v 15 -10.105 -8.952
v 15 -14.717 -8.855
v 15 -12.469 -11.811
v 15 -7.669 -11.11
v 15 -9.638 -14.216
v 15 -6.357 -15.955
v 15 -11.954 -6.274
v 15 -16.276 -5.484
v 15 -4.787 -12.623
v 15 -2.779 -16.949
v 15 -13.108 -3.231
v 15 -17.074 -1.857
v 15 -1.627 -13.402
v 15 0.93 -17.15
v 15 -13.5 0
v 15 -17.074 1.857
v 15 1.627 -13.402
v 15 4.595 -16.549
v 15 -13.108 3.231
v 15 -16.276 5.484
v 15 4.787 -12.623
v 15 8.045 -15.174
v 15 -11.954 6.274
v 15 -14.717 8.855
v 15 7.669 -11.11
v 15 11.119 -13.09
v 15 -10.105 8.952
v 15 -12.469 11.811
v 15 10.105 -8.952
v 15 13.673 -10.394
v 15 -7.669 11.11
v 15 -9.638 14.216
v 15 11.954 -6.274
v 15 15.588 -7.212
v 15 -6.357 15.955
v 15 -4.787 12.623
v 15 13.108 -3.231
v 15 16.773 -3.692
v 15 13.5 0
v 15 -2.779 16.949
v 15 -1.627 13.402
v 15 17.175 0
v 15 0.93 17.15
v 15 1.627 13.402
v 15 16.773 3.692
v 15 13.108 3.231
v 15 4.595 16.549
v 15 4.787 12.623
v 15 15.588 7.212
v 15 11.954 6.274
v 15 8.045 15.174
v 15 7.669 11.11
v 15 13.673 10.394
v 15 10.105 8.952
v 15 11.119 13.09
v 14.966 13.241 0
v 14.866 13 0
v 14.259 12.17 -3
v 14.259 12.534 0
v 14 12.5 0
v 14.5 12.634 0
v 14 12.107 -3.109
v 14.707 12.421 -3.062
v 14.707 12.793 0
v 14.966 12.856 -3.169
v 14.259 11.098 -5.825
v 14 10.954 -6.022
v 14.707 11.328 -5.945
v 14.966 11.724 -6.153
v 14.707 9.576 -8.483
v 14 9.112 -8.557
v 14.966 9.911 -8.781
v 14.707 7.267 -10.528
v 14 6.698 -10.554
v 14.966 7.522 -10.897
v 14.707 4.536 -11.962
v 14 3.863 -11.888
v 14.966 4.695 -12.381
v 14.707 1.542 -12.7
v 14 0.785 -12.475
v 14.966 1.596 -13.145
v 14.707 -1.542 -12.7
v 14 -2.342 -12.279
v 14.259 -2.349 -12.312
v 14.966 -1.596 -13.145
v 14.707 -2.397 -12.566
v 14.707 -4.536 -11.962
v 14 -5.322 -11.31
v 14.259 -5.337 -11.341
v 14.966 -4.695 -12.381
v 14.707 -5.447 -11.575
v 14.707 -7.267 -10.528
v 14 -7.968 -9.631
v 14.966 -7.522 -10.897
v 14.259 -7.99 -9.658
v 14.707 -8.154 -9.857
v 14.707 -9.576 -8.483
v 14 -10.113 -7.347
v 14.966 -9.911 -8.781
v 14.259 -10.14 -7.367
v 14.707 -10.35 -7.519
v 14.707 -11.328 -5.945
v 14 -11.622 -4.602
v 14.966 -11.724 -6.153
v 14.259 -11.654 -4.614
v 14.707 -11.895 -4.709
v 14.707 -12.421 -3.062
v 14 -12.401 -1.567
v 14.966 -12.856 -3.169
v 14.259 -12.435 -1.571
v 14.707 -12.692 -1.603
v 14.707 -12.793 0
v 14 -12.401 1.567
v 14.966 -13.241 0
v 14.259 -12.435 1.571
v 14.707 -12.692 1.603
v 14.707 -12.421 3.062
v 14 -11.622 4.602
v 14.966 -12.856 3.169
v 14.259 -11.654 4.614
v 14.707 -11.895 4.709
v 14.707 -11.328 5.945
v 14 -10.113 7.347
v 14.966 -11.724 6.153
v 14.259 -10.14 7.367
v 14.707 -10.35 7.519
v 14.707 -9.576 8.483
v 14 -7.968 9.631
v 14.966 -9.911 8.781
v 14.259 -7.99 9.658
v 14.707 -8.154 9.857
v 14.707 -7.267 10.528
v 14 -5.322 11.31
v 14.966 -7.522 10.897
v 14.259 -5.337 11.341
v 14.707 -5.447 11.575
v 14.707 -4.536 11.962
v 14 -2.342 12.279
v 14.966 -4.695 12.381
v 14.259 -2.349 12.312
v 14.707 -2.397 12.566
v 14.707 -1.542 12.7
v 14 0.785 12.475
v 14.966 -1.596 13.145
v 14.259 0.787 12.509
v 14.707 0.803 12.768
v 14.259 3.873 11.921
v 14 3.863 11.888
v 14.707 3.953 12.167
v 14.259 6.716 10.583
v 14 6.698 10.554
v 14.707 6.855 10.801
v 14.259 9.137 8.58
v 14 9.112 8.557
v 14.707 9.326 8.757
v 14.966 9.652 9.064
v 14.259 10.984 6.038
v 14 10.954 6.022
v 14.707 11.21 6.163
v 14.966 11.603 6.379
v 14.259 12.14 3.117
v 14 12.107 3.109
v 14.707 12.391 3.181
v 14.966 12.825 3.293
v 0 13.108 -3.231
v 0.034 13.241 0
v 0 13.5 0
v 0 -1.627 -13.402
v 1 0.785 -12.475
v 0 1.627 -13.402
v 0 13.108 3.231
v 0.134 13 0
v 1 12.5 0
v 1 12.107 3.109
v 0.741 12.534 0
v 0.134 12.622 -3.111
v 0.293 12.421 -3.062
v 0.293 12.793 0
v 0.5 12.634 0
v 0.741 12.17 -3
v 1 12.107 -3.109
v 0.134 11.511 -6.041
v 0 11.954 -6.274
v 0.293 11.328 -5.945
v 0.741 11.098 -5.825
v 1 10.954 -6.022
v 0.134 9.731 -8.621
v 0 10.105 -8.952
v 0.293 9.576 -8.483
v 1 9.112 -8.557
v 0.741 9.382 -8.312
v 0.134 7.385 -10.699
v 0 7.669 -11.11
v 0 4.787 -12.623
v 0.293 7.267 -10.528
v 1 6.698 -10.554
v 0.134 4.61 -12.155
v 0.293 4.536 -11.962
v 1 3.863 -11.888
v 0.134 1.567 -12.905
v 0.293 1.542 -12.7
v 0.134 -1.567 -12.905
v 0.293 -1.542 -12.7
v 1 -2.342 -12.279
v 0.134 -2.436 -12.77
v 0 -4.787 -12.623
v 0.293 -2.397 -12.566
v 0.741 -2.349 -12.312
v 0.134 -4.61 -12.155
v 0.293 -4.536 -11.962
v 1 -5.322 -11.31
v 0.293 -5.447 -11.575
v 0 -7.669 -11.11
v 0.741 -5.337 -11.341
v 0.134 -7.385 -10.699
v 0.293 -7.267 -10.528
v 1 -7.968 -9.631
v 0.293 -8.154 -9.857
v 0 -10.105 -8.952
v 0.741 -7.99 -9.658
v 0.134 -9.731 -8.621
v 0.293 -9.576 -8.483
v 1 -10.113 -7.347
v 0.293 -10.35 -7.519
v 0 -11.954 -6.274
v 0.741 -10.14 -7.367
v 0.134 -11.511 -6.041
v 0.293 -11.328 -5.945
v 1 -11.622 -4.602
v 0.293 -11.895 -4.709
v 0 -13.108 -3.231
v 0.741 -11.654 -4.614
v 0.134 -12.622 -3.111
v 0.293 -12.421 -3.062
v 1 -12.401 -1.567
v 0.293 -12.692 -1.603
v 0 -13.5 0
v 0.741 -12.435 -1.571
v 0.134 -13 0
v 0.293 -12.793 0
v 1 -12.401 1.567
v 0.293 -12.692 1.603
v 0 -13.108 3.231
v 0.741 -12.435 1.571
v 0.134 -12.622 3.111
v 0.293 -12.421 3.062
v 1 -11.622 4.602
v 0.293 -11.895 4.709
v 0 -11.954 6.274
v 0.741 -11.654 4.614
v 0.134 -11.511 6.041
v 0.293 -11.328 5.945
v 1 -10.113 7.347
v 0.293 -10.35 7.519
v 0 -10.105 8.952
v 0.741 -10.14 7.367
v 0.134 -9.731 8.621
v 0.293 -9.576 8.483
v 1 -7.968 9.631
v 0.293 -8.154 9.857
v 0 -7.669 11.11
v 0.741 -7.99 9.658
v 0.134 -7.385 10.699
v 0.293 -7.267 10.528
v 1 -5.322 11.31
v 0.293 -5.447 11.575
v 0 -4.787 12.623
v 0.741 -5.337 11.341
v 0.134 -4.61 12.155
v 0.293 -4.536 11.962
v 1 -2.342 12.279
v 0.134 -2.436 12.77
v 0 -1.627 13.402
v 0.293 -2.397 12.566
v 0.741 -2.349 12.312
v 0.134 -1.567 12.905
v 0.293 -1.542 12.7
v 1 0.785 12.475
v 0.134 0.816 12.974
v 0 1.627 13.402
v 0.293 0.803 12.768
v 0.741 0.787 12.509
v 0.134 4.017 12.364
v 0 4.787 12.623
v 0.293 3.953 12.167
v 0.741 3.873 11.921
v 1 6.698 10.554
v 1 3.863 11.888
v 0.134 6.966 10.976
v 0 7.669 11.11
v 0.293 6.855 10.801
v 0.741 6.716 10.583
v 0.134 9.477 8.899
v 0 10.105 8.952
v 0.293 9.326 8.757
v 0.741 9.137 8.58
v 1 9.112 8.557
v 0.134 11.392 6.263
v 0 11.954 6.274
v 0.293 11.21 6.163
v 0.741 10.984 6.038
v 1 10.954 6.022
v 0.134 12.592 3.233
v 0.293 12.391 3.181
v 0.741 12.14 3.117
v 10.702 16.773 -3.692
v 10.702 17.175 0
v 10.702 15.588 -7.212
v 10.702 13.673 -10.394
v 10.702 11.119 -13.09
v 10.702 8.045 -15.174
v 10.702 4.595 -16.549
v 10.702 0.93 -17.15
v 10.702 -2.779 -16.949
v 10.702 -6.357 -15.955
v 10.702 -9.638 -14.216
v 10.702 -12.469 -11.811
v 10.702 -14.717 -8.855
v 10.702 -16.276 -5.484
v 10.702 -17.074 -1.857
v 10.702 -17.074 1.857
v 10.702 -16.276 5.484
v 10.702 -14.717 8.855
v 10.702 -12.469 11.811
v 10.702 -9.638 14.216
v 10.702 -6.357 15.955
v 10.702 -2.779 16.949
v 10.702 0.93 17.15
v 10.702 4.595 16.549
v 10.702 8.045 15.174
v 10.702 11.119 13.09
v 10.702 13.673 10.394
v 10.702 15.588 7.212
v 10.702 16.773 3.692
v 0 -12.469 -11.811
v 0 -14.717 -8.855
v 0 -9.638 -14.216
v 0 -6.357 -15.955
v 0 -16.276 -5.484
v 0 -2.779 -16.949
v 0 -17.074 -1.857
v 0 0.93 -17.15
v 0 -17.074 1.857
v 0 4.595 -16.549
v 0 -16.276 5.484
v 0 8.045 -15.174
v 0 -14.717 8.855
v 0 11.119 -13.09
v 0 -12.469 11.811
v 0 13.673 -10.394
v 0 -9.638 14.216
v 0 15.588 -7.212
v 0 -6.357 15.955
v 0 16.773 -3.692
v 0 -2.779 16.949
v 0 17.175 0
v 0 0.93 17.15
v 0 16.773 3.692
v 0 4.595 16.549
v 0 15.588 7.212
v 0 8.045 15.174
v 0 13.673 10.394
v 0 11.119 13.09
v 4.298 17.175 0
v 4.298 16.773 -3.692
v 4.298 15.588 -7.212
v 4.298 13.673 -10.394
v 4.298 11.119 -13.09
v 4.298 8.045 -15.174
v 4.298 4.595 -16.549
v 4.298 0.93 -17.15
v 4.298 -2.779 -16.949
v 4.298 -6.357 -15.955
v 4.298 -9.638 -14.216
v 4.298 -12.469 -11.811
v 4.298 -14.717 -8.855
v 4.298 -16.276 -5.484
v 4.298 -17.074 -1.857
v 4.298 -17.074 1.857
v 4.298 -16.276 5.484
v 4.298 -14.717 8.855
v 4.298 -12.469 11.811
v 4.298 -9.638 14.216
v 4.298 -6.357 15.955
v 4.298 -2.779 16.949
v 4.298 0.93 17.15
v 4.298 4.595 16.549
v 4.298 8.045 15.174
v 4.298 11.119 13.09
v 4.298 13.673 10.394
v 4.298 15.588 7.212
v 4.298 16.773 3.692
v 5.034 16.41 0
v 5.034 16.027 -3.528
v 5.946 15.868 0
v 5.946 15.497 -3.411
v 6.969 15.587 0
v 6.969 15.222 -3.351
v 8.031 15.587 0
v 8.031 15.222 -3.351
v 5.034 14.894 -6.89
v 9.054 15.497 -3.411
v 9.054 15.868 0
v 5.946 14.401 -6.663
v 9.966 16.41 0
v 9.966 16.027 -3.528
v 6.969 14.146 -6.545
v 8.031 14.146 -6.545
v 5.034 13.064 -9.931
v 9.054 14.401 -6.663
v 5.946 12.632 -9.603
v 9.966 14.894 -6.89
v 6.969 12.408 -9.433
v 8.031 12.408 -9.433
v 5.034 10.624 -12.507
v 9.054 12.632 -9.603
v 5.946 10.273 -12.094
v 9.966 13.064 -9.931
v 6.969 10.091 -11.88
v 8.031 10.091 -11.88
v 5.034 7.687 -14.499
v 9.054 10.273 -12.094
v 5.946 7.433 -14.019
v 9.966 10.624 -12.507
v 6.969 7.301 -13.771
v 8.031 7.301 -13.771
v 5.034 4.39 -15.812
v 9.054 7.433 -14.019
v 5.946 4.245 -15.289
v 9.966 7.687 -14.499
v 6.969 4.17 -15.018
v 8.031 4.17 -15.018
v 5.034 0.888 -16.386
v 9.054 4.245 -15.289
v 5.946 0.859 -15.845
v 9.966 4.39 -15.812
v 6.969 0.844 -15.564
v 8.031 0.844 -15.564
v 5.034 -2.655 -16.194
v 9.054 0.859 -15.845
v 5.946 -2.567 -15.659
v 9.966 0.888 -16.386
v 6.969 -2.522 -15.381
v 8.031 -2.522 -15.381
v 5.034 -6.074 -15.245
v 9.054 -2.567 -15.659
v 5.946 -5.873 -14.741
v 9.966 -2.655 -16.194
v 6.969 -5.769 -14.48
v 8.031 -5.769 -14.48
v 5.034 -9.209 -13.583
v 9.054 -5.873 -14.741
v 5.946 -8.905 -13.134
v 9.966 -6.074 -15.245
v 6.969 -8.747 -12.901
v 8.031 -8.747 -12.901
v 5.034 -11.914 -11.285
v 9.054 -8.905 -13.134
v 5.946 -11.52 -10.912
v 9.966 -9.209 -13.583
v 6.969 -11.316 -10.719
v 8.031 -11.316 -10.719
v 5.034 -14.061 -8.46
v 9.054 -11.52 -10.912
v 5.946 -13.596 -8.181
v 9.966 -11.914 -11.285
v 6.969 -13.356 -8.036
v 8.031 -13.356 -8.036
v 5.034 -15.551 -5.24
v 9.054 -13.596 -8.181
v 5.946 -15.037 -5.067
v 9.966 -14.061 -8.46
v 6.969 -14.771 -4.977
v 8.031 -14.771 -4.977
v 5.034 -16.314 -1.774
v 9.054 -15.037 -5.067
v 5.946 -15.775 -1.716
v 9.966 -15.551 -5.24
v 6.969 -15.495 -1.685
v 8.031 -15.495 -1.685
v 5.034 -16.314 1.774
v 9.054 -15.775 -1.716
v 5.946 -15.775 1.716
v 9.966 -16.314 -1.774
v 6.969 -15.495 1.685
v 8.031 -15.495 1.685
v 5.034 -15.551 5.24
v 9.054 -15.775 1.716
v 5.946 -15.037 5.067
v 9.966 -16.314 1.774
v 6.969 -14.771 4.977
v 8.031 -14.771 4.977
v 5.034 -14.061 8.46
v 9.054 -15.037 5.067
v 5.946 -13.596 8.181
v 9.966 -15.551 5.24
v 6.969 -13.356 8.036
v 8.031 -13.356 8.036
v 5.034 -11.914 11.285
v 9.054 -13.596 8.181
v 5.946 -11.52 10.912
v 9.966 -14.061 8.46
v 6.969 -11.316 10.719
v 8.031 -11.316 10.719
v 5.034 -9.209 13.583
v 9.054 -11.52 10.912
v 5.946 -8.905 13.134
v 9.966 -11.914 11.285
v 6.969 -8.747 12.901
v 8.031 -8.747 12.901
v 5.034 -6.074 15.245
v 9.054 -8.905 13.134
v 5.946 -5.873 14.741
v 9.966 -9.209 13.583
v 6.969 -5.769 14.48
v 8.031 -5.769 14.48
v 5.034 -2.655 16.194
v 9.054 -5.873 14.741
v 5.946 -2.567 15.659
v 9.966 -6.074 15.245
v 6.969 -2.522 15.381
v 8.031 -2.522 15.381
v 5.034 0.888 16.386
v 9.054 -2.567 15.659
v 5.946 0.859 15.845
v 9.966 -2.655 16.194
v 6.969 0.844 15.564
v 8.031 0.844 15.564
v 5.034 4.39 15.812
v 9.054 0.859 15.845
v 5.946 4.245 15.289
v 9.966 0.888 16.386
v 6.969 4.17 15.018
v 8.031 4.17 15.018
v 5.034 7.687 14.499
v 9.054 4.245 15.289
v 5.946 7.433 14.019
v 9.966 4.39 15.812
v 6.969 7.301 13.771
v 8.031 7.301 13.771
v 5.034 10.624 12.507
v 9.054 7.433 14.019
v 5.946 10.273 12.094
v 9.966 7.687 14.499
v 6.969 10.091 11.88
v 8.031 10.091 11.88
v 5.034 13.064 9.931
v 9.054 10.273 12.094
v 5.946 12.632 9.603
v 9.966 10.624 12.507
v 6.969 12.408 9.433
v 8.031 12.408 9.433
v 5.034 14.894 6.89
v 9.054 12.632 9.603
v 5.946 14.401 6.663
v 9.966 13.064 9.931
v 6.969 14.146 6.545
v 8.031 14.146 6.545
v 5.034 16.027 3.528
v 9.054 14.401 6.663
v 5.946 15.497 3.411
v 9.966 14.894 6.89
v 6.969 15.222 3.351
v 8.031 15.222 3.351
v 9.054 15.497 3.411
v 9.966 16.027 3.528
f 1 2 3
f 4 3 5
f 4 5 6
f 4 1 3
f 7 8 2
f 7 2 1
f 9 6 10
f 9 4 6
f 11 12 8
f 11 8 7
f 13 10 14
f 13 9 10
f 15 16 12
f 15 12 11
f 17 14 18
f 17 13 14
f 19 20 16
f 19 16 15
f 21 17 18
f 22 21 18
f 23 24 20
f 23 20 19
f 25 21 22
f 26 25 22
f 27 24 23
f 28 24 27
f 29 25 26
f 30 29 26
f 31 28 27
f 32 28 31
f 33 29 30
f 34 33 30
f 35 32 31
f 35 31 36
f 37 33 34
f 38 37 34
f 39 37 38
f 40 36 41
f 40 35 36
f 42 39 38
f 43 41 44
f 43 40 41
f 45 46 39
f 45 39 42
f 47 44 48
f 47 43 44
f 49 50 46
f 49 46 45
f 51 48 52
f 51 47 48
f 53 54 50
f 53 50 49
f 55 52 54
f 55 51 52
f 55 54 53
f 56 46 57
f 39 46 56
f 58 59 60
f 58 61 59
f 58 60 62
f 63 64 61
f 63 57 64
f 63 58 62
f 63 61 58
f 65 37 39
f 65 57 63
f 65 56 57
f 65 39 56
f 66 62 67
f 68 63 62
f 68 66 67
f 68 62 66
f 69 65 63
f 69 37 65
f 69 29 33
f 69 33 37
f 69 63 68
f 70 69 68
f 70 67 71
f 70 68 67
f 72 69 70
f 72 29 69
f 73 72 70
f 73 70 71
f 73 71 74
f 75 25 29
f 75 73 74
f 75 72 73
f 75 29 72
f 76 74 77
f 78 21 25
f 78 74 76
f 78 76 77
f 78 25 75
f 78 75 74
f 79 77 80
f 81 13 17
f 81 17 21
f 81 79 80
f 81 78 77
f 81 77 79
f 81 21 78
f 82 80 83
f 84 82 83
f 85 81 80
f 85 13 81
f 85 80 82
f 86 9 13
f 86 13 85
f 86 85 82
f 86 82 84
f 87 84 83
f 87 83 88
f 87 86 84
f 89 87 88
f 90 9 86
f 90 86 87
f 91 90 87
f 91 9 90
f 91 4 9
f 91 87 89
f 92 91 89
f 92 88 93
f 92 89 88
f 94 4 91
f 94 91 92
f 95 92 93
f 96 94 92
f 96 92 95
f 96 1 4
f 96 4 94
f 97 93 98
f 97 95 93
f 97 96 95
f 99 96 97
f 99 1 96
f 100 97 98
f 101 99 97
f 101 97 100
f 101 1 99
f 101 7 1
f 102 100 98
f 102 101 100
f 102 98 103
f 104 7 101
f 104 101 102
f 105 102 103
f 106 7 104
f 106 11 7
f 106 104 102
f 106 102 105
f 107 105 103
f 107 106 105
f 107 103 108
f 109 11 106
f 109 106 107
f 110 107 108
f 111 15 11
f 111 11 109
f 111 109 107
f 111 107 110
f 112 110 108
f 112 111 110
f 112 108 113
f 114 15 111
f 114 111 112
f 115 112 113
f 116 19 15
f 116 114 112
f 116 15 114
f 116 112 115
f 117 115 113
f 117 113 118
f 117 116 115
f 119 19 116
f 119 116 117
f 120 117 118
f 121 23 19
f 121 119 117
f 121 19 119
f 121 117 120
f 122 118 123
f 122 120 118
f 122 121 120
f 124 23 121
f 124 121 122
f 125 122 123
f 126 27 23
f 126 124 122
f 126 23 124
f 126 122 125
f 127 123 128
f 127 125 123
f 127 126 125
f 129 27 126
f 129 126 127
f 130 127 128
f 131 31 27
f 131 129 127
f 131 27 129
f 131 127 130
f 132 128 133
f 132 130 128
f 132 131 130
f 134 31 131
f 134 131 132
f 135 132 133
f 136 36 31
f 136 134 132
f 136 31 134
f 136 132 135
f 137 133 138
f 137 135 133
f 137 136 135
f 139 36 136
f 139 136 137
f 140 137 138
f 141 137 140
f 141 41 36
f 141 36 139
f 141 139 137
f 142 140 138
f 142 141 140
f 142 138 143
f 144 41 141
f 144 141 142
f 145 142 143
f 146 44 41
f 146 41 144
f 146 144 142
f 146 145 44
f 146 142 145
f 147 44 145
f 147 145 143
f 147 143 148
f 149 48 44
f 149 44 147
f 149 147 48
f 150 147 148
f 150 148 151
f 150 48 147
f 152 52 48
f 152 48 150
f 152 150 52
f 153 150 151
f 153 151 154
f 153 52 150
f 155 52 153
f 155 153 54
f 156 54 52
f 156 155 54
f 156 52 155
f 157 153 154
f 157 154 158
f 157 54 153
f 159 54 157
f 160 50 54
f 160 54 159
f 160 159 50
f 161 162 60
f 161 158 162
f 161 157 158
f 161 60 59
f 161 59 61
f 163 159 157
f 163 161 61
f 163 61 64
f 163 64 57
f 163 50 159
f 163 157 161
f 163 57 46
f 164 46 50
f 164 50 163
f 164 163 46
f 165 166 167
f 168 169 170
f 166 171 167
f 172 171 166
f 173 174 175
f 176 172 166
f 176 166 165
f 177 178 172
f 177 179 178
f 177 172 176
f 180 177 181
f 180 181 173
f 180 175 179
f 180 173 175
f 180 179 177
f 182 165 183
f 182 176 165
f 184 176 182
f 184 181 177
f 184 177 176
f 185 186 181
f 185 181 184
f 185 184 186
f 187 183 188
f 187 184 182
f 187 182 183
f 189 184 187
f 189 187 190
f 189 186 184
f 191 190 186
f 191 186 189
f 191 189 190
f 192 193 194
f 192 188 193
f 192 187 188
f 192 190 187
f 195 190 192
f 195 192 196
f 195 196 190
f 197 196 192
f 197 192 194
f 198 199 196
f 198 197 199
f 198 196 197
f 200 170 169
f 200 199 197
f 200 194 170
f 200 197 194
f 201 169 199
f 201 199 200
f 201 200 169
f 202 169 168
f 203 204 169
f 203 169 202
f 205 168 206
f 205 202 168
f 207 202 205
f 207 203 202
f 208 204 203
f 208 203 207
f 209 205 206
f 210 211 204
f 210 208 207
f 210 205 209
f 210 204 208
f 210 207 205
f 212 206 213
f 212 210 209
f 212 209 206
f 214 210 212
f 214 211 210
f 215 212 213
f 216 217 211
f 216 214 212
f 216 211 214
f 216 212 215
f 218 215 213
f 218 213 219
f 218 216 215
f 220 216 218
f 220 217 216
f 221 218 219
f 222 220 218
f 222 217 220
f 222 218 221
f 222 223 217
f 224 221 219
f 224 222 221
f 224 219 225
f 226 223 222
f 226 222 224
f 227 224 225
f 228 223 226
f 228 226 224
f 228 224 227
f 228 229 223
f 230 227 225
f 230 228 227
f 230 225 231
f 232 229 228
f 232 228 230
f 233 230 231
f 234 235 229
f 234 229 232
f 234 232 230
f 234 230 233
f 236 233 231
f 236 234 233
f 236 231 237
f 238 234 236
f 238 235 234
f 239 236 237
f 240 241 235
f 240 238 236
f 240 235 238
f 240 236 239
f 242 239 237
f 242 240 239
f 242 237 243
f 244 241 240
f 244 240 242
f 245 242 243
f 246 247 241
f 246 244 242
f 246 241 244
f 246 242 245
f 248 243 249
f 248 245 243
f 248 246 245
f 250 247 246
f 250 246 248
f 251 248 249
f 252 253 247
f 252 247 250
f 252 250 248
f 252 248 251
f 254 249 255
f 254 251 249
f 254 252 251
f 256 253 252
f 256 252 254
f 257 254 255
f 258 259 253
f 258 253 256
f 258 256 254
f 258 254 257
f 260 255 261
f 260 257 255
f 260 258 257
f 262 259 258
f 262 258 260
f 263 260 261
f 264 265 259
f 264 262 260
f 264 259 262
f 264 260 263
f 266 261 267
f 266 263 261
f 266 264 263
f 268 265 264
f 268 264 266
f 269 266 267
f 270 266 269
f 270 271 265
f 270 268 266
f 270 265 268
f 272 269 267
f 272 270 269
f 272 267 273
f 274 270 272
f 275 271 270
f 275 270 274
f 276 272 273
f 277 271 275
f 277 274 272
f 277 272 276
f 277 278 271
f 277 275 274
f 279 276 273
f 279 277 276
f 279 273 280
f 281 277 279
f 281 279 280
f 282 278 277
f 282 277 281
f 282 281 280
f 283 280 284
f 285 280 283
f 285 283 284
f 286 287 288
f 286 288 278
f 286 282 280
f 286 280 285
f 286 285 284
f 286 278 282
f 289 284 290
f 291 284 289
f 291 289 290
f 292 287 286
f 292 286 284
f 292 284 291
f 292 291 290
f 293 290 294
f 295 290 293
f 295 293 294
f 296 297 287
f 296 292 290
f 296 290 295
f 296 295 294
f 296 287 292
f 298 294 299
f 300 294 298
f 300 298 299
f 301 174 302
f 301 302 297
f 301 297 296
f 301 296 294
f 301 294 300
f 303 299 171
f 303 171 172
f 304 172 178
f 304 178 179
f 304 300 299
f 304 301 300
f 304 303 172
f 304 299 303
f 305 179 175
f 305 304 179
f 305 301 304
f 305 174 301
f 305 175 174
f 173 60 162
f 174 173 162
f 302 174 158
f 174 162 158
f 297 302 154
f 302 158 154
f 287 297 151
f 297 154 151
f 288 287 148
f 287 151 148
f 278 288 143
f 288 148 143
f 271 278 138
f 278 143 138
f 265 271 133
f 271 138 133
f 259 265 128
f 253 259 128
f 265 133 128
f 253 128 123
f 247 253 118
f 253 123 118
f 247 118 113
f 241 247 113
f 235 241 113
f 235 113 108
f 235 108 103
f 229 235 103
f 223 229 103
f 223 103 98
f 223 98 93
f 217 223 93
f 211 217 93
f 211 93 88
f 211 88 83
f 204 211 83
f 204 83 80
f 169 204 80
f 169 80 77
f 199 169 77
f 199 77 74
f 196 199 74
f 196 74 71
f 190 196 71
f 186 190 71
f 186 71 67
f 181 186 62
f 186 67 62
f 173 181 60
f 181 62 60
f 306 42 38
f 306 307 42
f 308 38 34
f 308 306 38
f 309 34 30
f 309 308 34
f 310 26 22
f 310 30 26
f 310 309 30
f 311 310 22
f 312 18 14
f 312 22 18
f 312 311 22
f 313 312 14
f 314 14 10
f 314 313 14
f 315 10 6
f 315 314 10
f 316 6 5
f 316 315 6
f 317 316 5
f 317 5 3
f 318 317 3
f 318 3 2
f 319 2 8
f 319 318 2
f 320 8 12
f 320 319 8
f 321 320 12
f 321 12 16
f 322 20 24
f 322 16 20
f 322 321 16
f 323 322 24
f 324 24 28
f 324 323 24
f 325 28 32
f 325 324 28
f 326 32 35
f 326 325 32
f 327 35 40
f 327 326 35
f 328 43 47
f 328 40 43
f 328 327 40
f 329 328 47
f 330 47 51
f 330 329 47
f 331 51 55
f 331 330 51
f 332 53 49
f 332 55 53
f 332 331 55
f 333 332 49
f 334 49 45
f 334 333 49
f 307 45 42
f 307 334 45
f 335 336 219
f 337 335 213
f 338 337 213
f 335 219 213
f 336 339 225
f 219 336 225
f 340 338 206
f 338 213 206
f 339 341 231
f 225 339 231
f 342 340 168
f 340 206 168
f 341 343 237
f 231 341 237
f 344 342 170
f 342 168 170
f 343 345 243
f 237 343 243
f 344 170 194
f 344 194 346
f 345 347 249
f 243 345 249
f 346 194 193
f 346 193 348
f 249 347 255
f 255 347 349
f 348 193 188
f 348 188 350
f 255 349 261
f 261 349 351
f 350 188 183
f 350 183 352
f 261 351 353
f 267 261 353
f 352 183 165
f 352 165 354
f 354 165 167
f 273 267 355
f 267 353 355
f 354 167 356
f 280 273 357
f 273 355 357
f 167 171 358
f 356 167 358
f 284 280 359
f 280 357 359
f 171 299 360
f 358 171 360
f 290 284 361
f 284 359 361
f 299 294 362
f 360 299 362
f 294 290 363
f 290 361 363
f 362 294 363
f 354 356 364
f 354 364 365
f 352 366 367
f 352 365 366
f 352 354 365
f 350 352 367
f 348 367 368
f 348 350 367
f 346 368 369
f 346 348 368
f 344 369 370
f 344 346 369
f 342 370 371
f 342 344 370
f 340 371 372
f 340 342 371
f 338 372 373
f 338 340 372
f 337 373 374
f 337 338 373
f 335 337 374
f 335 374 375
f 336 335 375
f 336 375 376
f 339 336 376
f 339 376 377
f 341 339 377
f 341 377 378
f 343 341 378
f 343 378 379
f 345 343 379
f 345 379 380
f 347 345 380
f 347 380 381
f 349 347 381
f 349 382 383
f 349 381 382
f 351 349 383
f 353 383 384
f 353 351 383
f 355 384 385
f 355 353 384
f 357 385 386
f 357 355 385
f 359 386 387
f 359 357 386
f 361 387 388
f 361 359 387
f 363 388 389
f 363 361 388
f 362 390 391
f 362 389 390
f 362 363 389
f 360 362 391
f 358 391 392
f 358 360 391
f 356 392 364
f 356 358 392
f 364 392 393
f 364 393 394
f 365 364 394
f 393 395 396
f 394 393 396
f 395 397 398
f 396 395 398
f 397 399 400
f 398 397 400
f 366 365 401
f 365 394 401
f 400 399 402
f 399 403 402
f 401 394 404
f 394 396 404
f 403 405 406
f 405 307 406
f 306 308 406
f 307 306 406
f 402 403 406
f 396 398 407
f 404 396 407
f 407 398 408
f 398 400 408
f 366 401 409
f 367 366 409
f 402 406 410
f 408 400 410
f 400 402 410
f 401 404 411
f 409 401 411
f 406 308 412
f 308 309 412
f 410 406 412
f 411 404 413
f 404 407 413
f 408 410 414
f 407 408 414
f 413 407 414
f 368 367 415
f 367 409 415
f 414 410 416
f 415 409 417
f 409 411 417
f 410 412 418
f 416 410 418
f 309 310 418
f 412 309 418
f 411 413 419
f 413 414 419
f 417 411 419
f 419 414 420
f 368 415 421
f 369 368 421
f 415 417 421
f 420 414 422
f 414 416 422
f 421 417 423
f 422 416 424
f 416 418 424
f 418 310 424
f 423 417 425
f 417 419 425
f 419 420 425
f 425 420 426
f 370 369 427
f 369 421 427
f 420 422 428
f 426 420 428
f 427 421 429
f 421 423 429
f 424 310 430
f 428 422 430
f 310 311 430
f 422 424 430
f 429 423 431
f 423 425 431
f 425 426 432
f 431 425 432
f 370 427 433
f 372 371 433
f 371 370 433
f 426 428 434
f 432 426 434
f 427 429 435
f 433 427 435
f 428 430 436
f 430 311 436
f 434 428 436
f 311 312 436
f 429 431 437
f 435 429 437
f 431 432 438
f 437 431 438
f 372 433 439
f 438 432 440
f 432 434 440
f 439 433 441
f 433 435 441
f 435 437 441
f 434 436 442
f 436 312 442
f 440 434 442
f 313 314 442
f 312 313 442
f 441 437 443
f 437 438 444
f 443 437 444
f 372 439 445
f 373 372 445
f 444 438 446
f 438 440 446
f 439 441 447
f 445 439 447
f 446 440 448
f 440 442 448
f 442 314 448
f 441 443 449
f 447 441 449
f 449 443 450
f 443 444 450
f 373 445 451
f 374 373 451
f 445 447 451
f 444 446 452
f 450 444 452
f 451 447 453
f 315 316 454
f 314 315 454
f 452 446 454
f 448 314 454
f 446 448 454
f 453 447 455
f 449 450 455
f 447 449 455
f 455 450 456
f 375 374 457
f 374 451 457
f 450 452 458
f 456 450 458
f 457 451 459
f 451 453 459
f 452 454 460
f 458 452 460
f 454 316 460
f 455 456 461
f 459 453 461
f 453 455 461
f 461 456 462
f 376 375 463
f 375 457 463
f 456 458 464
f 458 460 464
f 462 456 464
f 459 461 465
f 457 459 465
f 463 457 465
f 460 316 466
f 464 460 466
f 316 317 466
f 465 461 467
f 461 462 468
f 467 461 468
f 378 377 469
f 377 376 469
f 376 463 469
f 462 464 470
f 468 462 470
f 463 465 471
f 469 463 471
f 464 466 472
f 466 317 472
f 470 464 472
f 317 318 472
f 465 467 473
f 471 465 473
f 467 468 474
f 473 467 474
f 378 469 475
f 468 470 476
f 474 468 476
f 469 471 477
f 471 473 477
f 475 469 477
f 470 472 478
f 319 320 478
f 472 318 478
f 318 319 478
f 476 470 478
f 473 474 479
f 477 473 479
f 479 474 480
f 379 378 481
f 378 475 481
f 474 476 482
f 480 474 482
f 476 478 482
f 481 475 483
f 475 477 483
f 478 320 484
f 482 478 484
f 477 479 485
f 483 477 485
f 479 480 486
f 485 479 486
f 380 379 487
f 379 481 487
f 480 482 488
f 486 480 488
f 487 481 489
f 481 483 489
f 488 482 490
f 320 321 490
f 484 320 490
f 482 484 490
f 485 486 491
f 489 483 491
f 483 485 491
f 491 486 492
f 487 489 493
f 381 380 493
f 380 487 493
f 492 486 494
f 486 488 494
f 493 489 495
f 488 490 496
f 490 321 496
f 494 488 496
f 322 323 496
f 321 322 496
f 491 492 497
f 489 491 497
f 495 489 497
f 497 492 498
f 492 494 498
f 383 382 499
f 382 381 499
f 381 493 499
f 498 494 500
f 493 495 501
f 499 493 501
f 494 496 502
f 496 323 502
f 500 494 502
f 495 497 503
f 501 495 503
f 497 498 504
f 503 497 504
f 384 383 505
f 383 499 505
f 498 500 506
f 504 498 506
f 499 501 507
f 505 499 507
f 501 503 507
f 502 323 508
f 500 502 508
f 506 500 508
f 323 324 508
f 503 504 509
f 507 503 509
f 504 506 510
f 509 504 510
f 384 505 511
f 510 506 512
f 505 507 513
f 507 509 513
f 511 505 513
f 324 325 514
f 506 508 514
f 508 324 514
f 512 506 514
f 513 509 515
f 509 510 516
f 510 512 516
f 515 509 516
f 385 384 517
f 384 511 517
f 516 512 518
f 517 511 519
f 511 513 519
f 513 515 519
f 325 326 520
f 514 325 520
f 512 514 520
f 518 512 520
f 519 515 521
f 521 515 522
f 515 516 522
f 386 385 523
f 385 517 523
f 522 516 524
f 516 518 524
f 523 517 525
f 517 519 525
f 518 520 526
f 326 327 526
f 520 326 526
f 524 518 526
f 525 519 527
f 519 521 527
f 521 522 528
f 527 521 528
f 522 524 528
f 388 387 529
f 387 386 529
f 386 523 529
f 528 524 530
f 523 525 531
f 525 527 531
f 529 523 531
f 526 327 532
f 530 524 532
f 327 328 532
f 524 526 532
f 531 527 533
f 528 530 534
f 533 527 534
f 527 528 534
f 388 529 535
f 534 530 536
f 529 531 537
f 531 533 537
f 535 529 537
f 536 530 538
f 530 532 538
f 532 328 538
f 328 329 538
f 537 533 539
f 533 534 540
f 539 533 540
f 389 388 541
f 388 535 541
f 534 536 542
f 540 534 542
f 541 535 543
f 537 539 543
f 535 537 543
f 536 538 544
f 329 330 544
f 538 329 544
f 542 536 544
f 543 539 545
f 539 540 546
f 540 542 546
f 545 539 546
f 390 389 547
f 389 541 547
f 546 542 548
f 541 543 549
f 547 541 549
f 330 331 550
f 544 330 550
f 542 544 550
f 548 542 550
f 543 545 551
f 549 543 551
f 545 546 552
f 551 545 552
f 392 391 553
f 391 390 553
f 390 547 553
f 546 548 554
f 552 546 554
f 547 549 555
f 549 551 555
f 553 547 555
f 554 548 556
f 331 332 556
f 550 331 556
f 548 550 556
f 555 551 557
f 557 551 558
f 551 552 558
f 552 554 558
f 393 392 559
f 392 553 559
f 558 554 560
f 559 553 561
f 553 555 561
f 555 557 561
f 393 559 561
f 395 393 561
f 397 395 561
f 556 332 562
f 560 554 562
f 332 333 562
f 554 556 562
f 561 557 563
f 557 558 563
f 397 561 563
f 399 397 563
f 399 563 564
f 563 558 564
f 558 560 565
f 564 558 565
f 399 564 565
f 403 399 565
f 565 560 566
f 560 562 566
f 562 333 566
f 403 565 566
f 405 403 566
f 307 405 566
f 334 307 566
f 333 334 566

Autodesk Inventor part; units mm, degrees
ref_plane "YZ Plane" through (0, 0, 0) normal (1, 0, 0) x (0, 1, 0)
ref_plane "XZ Plane" through (0, 0, 0) normal (0, 1, 0) x (-1, 0, 0)
ref_plane "XY Plane" through (0, 0, 0) normal (0, 0, 1) x (1, 0, 0)
sketch "Sketch_1" plane through (0, 0, 0) normal (0, 0, 1) x (1, 0, 0)
  line L0 (50, 0) -> (-50, 0)
  arc A0 (0, 13.5) -> (1, 12.5) centre (1, 13.5) ccw
  line L1 (1, 12.5) -> (14, 12.5)
  arc A1 (14, 12.5) -> (15, 13.5) centre (14, 13.5) ccw
  line L2 (15, 13.5) -> (15, 17.175)
  line L3 (15, 17.175) -> (10.7022, 17.175)
  arc A2 (4.2978, 17.175) -> (10.7022, 17.175) centre (7.5, 19.52) ccw
  line L4 (4.2978, 17.175) -> (0, 17.175)
  line L5 (0, 17.175) -> (0, 13.5)
revolve "Revolution1" add sketch "Sketch_1" angle 360 about axis through (50, 0, 0) along (1, 0, 0)
properties part number "6205_PART1"
